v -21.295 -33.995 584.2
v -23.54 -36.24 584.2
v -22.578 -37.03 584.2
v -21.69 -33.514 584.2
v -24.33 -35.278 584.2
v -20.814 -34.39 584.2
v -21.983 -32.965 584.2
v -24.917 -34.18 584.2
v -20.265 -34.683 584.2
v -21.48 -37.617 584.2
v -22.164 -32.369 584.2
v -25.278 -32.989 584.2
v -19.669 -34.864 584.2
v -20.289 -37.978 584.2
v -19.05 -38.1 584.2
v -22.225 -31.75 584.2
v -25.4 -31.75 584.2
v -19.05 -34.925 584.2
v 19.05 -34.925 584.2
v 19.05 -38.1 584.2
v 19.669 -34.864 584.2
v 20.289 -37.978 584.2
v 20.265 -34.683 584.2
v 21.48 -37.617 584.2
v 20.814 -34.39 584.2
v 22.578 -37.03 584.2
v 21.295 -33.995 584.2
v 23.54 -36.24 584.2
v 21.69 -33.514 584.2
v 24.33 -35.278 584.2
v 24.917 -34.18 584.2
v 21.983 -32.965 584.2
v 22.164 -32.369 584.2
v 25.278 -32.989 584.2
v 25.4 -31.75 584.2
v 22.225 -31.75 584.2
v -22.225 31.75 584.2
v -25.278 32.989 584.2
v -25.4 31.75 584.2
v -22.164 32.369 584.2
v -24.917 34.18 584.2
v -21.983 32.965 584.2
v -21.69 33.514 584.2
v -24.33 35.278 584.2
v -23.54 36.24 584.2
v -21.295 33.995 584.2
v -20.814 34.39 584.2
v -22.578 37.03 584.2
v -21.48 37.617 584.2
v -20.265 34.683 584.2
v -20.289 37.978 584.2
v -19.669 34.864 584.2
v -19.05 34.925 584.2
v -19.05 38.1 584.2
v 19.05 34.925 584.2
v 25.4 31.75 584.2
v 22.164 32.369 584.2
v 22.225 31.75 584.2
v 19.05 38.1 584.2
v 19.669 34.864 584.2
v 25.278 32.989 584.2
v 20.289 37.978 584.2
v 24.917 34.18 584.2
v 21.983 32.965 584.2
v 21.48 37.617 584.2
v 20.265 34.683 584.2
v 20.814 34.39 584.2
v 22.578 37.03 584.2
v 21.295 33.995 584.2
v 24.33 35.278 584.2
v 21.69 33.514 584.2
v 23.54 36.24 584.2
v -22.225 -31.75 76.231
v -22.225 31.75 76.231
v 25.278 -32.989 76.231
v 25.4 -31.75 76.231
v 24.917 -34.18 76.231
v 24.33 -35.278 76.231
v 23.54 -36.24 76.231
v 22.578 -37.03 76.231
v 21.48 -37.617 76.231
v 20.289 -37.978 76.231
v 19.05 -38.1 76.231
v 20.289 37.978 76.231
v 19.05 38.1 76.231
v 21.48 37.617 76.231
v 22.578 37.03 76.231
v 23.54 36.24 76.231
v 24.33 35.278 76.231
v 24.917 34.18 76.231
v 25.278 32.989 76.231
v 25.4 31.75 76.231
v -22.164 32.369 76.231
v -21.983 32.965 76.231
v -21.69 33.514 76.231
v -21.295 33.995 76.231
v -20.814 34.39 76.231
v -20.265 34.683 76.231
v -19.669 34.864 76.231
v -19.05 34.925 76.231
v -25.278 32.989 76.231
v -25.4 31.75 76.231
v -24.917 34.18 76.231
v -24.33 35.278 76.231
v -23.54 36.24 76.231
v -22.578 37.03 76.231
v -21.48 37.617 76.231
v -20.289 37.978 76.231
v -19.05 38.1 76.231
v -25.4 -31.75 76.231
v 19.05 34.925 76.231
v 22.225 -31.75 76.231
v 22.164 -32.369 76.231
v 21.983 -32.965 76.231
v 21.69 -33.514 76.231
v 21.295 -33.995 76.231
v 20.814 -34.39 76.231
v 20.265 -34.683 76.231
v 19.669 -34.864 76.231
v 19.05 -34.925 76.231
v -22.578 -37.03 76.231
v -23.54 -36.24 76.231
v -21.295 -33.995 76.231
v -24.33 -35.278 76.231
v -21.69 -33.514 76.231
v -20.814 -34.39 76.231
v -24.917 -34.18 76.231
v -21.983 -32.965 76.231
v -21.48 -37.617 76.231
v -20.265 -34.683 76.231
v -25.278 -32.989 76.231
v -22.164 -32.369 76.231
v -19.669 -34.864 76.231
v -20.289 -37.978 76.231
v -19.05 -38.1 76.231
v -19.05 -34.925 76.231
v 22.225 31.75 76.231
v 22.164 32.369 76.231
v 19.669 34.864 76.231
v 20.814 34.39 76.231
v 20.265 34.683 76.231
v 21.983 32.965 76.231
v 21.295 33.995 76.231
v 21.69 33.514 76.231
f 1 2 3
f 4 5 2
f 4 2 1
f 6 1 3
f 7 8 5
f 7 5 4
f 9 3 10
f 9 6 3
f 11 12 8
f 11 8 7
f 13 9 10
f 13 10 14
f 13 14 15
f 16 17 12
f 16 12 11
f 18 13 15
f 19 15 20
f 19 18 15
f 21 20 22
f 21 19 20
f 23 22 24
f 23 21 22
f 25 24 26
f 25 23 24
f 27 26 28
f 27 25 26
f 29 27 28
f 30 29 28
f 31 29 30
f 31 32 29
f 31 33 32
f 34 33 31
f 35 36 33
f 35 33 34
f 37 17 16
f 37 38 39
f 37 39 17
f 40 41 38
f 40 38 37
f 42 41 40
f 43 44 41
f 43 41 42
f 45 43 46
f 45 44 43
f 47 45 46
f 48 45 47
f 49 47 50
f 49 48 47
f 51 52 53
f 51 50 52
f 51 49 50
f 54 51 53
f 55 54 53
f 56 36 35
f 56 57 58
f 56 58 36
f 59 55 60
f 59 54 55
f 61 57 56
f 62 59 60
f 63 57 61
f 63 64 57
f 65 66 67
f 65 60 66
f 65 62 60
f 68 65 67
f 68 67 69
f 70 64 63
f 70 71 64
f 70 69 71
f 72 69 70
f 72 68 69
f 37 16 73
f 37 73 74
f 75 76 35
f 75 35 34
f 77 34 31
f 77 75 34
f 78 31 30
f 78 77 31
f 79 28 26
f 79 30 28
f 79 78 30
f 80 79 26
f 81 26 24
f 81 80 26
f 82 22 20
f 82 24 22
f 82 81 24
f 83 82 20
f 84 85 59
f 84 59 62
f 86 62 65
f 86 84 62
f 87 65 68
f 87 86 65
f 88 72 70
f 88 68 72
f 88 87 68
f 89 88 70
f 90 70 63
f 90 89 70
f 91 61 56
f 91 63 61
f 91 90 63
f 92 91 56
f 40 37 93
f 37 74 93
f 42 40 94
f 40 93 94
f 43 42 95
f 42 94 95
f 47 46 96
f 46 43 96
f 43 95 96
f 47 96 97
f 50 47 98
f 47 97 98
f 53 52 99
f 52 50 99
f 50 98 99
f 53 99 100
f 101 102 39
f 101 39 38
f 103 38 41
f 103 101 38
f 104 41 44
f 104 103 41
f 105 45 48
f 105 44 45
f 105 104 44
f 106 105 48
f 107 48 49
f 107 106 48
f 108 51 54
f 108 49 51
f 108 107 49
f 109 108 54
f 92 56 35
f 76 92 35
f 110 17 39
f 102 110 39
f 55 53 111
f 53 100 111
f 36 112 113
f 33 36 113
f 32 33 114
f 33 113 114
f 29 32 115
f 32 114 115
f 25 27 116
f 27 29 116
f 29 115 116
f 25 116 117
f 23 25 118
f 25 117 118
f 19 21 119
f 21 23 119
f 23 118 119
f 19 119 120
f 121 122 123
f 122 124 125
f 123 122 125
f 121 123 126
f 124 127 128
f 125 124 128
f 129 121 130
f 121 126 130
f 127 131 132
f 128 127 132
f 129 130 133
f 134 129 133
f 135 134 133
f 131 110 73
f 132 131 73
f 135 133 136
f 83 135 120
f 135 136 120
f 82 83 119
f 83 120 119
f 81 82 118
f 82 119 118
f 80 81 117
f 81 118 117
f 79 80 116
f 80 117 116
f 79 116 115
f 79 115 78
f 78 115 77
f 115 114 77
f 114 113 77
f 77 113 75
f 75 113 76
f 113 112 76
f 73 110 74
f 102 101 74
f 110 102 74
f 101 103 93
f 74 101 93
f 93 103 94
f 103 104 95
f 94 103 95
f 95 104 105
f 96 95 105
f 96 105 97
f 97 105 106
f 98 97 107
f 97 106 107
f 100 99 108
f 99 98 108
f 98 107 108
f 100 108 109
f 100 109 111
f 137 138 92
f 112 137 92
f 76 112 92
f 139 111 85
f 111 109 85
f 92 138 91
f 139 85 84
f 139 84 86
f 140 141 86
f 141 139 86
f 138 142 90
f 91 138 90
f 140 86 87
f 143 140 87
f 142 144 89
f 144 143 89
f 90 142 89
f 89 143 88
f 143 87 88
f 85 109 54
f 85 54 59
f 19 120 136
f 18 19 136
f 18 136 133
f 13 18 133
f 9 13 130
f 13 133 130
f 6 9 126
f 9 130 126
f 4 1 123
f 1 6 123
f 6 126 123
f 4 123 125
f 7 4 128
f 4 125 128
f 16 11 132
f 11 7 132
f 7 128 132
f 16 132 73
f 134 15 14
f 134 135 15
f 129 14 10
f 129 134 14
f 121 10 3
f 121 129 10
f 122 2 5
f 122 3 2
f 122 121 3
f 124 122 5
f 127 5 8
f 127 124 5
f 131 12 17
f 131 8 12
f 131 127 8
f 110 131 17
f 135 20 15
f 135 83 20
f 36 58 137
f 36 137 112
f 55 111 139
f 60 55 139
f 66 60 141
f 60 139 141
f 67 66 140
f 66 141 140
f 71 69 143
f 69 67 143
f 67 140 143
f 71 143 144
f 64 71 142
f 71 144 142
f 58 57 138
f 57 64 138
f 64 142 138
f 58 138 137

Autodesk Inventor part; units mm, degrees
ref_plane "Start Plane" through (0, 0, 76.231) normal (0, 0, 1) x (1, 0, 0)
ref_plane "End Plane" through (0, 0, 584.2) normal (0, 0, 1) x (1, 0, 0)
sketch "Sketch" plane through (0, 0, 0) normal (0, 0, 1) x (1, 0, 0)
  line L0 (-25.4, -31.75) -> (-25.4, 31.75)
  line L1 (-19.05, 38.1) -> (19.05, 38.1)
  line L2 (25.4, 31.75) -> (25.4, -31.75)
  line L3 (19.05, -38.1) -> (-19.05, -38.1)
  arc A0 (-25.4, -31.75) -> (-19.05, -38.1) centre (-19.05, -31.75) ccw
  arc A1 (-19.05, 38.1) -> (-25.4, 31.75) centre (-19.05, 31.75) ccw
  arc A2 (25.4, 31.75) -> (19.05, 38.1) centre (19.05, 31.75) ccw
  arc A3 (19.05, -38.1) -> (25.4, -31.75) centre (19.05, -31.75) ccw
  arc A4 (-19.05, 34.925) -> (-22.225, 31.75) centre (-19.05, 31.75) ccw
  line L4 (-19.05, 34.925) -> (19.05, 34.925)
  arc A5 (22.225, 31.75) -> (19.05, 34.925) centre (19.05, 31.75) ccw
  line L5 (22.225, 31.75) -> (22.225, -31.75)
  arc A6 (19.05, -34.925) -> (22.225, -31.75) centre (19.05, -31.75) ccw
  line L6 (19.05, -34.925) -> (-19.05, -34.925)
  arc A7 (-22.225, -31.75) -> (-19.05, -34.925) centre (-19.05, -31.75) ccw
  line L7 (-22.225, -31.75) -> (-22.225, 31.75)
  line L8 (0, 55.1812) -> (0, -55.1812) construction
  line L9 (-37.4012, 0) -> (37.4012, 0) construction
  dimension "d10" = 76.2
  dimension "d11" = 50.8
  dimension "d12" = 3.175
  dimension "d15" = 38.1
  dimension "d16" = 25.4
  dimension "d17" = 6.35
extrude "Body" add sketch "Sketch" along normal up to surface (507.969 mm away) from surface at 76.231
sketch "Sketch3" plane through (0, 0, 0) normal (0, 0, 1) x (1, 0, 0)
  line L0 (0, 0) -> (10, 0)
ref_plane "Work Plane3" through (0, 0, 0) normal (0, -1, 0) x (1, 0, 0)
ref_plane "Work Plane4" through (-25.4, -38.131, 584.2) normal (0, 0, 1) x (1, 0, 0)
split "Split1" plane through (-25.4, -38.131, 584.2) removes the side toward (0, 0, 1)
ref_plane "Work Plane5" through (0, -1230.9, 76.231) normal (0, 0, -1) x (-1, 0, 0)
split "Split2" plane through (0, -1230.9, 76.231) removes the side toward (0, 0, -1)
sketch "Sketch4" plane through (0, 0, 0) normal (0, -1, 0) x (1, 0, 0)
  line L0 (-2, 76.231) -> (12, 76.231) projected
  line L1 (-2, 584.2) -> (12, 584.2) projected
  dimension "d19" = 507.969
equation "\"d10\" = G_H"
equation "\"d11\" = G_W"
equation "\"d12\" = G_T"
equation "\"d15\" = 0.5 * d10"
equation "\"d16\" = 0.5 * d11"
equation "\"d17\" = G_IR"
equation "\"G_W\" = 50.8"
equation "\"G_H\" = 76.2"
equation "\"G_T\" = 3.175"
equation "\"G_IR\" = 6.35"
equation "\"G_L\" = d19"
equation "\"G_OFFSET_START\" = -76.231"
equation "\"G_OFFSET_END\" = 0"
equation "\"d13\" = -G_OFFSET_START"
equation "\"d14\" = G_OFFSET_END + B_L"
equation "\"B_L\" = 584.2"
properties part number "AISC - 3 x 2 x 1/8 - 19.999" material "Steel, Mild"
